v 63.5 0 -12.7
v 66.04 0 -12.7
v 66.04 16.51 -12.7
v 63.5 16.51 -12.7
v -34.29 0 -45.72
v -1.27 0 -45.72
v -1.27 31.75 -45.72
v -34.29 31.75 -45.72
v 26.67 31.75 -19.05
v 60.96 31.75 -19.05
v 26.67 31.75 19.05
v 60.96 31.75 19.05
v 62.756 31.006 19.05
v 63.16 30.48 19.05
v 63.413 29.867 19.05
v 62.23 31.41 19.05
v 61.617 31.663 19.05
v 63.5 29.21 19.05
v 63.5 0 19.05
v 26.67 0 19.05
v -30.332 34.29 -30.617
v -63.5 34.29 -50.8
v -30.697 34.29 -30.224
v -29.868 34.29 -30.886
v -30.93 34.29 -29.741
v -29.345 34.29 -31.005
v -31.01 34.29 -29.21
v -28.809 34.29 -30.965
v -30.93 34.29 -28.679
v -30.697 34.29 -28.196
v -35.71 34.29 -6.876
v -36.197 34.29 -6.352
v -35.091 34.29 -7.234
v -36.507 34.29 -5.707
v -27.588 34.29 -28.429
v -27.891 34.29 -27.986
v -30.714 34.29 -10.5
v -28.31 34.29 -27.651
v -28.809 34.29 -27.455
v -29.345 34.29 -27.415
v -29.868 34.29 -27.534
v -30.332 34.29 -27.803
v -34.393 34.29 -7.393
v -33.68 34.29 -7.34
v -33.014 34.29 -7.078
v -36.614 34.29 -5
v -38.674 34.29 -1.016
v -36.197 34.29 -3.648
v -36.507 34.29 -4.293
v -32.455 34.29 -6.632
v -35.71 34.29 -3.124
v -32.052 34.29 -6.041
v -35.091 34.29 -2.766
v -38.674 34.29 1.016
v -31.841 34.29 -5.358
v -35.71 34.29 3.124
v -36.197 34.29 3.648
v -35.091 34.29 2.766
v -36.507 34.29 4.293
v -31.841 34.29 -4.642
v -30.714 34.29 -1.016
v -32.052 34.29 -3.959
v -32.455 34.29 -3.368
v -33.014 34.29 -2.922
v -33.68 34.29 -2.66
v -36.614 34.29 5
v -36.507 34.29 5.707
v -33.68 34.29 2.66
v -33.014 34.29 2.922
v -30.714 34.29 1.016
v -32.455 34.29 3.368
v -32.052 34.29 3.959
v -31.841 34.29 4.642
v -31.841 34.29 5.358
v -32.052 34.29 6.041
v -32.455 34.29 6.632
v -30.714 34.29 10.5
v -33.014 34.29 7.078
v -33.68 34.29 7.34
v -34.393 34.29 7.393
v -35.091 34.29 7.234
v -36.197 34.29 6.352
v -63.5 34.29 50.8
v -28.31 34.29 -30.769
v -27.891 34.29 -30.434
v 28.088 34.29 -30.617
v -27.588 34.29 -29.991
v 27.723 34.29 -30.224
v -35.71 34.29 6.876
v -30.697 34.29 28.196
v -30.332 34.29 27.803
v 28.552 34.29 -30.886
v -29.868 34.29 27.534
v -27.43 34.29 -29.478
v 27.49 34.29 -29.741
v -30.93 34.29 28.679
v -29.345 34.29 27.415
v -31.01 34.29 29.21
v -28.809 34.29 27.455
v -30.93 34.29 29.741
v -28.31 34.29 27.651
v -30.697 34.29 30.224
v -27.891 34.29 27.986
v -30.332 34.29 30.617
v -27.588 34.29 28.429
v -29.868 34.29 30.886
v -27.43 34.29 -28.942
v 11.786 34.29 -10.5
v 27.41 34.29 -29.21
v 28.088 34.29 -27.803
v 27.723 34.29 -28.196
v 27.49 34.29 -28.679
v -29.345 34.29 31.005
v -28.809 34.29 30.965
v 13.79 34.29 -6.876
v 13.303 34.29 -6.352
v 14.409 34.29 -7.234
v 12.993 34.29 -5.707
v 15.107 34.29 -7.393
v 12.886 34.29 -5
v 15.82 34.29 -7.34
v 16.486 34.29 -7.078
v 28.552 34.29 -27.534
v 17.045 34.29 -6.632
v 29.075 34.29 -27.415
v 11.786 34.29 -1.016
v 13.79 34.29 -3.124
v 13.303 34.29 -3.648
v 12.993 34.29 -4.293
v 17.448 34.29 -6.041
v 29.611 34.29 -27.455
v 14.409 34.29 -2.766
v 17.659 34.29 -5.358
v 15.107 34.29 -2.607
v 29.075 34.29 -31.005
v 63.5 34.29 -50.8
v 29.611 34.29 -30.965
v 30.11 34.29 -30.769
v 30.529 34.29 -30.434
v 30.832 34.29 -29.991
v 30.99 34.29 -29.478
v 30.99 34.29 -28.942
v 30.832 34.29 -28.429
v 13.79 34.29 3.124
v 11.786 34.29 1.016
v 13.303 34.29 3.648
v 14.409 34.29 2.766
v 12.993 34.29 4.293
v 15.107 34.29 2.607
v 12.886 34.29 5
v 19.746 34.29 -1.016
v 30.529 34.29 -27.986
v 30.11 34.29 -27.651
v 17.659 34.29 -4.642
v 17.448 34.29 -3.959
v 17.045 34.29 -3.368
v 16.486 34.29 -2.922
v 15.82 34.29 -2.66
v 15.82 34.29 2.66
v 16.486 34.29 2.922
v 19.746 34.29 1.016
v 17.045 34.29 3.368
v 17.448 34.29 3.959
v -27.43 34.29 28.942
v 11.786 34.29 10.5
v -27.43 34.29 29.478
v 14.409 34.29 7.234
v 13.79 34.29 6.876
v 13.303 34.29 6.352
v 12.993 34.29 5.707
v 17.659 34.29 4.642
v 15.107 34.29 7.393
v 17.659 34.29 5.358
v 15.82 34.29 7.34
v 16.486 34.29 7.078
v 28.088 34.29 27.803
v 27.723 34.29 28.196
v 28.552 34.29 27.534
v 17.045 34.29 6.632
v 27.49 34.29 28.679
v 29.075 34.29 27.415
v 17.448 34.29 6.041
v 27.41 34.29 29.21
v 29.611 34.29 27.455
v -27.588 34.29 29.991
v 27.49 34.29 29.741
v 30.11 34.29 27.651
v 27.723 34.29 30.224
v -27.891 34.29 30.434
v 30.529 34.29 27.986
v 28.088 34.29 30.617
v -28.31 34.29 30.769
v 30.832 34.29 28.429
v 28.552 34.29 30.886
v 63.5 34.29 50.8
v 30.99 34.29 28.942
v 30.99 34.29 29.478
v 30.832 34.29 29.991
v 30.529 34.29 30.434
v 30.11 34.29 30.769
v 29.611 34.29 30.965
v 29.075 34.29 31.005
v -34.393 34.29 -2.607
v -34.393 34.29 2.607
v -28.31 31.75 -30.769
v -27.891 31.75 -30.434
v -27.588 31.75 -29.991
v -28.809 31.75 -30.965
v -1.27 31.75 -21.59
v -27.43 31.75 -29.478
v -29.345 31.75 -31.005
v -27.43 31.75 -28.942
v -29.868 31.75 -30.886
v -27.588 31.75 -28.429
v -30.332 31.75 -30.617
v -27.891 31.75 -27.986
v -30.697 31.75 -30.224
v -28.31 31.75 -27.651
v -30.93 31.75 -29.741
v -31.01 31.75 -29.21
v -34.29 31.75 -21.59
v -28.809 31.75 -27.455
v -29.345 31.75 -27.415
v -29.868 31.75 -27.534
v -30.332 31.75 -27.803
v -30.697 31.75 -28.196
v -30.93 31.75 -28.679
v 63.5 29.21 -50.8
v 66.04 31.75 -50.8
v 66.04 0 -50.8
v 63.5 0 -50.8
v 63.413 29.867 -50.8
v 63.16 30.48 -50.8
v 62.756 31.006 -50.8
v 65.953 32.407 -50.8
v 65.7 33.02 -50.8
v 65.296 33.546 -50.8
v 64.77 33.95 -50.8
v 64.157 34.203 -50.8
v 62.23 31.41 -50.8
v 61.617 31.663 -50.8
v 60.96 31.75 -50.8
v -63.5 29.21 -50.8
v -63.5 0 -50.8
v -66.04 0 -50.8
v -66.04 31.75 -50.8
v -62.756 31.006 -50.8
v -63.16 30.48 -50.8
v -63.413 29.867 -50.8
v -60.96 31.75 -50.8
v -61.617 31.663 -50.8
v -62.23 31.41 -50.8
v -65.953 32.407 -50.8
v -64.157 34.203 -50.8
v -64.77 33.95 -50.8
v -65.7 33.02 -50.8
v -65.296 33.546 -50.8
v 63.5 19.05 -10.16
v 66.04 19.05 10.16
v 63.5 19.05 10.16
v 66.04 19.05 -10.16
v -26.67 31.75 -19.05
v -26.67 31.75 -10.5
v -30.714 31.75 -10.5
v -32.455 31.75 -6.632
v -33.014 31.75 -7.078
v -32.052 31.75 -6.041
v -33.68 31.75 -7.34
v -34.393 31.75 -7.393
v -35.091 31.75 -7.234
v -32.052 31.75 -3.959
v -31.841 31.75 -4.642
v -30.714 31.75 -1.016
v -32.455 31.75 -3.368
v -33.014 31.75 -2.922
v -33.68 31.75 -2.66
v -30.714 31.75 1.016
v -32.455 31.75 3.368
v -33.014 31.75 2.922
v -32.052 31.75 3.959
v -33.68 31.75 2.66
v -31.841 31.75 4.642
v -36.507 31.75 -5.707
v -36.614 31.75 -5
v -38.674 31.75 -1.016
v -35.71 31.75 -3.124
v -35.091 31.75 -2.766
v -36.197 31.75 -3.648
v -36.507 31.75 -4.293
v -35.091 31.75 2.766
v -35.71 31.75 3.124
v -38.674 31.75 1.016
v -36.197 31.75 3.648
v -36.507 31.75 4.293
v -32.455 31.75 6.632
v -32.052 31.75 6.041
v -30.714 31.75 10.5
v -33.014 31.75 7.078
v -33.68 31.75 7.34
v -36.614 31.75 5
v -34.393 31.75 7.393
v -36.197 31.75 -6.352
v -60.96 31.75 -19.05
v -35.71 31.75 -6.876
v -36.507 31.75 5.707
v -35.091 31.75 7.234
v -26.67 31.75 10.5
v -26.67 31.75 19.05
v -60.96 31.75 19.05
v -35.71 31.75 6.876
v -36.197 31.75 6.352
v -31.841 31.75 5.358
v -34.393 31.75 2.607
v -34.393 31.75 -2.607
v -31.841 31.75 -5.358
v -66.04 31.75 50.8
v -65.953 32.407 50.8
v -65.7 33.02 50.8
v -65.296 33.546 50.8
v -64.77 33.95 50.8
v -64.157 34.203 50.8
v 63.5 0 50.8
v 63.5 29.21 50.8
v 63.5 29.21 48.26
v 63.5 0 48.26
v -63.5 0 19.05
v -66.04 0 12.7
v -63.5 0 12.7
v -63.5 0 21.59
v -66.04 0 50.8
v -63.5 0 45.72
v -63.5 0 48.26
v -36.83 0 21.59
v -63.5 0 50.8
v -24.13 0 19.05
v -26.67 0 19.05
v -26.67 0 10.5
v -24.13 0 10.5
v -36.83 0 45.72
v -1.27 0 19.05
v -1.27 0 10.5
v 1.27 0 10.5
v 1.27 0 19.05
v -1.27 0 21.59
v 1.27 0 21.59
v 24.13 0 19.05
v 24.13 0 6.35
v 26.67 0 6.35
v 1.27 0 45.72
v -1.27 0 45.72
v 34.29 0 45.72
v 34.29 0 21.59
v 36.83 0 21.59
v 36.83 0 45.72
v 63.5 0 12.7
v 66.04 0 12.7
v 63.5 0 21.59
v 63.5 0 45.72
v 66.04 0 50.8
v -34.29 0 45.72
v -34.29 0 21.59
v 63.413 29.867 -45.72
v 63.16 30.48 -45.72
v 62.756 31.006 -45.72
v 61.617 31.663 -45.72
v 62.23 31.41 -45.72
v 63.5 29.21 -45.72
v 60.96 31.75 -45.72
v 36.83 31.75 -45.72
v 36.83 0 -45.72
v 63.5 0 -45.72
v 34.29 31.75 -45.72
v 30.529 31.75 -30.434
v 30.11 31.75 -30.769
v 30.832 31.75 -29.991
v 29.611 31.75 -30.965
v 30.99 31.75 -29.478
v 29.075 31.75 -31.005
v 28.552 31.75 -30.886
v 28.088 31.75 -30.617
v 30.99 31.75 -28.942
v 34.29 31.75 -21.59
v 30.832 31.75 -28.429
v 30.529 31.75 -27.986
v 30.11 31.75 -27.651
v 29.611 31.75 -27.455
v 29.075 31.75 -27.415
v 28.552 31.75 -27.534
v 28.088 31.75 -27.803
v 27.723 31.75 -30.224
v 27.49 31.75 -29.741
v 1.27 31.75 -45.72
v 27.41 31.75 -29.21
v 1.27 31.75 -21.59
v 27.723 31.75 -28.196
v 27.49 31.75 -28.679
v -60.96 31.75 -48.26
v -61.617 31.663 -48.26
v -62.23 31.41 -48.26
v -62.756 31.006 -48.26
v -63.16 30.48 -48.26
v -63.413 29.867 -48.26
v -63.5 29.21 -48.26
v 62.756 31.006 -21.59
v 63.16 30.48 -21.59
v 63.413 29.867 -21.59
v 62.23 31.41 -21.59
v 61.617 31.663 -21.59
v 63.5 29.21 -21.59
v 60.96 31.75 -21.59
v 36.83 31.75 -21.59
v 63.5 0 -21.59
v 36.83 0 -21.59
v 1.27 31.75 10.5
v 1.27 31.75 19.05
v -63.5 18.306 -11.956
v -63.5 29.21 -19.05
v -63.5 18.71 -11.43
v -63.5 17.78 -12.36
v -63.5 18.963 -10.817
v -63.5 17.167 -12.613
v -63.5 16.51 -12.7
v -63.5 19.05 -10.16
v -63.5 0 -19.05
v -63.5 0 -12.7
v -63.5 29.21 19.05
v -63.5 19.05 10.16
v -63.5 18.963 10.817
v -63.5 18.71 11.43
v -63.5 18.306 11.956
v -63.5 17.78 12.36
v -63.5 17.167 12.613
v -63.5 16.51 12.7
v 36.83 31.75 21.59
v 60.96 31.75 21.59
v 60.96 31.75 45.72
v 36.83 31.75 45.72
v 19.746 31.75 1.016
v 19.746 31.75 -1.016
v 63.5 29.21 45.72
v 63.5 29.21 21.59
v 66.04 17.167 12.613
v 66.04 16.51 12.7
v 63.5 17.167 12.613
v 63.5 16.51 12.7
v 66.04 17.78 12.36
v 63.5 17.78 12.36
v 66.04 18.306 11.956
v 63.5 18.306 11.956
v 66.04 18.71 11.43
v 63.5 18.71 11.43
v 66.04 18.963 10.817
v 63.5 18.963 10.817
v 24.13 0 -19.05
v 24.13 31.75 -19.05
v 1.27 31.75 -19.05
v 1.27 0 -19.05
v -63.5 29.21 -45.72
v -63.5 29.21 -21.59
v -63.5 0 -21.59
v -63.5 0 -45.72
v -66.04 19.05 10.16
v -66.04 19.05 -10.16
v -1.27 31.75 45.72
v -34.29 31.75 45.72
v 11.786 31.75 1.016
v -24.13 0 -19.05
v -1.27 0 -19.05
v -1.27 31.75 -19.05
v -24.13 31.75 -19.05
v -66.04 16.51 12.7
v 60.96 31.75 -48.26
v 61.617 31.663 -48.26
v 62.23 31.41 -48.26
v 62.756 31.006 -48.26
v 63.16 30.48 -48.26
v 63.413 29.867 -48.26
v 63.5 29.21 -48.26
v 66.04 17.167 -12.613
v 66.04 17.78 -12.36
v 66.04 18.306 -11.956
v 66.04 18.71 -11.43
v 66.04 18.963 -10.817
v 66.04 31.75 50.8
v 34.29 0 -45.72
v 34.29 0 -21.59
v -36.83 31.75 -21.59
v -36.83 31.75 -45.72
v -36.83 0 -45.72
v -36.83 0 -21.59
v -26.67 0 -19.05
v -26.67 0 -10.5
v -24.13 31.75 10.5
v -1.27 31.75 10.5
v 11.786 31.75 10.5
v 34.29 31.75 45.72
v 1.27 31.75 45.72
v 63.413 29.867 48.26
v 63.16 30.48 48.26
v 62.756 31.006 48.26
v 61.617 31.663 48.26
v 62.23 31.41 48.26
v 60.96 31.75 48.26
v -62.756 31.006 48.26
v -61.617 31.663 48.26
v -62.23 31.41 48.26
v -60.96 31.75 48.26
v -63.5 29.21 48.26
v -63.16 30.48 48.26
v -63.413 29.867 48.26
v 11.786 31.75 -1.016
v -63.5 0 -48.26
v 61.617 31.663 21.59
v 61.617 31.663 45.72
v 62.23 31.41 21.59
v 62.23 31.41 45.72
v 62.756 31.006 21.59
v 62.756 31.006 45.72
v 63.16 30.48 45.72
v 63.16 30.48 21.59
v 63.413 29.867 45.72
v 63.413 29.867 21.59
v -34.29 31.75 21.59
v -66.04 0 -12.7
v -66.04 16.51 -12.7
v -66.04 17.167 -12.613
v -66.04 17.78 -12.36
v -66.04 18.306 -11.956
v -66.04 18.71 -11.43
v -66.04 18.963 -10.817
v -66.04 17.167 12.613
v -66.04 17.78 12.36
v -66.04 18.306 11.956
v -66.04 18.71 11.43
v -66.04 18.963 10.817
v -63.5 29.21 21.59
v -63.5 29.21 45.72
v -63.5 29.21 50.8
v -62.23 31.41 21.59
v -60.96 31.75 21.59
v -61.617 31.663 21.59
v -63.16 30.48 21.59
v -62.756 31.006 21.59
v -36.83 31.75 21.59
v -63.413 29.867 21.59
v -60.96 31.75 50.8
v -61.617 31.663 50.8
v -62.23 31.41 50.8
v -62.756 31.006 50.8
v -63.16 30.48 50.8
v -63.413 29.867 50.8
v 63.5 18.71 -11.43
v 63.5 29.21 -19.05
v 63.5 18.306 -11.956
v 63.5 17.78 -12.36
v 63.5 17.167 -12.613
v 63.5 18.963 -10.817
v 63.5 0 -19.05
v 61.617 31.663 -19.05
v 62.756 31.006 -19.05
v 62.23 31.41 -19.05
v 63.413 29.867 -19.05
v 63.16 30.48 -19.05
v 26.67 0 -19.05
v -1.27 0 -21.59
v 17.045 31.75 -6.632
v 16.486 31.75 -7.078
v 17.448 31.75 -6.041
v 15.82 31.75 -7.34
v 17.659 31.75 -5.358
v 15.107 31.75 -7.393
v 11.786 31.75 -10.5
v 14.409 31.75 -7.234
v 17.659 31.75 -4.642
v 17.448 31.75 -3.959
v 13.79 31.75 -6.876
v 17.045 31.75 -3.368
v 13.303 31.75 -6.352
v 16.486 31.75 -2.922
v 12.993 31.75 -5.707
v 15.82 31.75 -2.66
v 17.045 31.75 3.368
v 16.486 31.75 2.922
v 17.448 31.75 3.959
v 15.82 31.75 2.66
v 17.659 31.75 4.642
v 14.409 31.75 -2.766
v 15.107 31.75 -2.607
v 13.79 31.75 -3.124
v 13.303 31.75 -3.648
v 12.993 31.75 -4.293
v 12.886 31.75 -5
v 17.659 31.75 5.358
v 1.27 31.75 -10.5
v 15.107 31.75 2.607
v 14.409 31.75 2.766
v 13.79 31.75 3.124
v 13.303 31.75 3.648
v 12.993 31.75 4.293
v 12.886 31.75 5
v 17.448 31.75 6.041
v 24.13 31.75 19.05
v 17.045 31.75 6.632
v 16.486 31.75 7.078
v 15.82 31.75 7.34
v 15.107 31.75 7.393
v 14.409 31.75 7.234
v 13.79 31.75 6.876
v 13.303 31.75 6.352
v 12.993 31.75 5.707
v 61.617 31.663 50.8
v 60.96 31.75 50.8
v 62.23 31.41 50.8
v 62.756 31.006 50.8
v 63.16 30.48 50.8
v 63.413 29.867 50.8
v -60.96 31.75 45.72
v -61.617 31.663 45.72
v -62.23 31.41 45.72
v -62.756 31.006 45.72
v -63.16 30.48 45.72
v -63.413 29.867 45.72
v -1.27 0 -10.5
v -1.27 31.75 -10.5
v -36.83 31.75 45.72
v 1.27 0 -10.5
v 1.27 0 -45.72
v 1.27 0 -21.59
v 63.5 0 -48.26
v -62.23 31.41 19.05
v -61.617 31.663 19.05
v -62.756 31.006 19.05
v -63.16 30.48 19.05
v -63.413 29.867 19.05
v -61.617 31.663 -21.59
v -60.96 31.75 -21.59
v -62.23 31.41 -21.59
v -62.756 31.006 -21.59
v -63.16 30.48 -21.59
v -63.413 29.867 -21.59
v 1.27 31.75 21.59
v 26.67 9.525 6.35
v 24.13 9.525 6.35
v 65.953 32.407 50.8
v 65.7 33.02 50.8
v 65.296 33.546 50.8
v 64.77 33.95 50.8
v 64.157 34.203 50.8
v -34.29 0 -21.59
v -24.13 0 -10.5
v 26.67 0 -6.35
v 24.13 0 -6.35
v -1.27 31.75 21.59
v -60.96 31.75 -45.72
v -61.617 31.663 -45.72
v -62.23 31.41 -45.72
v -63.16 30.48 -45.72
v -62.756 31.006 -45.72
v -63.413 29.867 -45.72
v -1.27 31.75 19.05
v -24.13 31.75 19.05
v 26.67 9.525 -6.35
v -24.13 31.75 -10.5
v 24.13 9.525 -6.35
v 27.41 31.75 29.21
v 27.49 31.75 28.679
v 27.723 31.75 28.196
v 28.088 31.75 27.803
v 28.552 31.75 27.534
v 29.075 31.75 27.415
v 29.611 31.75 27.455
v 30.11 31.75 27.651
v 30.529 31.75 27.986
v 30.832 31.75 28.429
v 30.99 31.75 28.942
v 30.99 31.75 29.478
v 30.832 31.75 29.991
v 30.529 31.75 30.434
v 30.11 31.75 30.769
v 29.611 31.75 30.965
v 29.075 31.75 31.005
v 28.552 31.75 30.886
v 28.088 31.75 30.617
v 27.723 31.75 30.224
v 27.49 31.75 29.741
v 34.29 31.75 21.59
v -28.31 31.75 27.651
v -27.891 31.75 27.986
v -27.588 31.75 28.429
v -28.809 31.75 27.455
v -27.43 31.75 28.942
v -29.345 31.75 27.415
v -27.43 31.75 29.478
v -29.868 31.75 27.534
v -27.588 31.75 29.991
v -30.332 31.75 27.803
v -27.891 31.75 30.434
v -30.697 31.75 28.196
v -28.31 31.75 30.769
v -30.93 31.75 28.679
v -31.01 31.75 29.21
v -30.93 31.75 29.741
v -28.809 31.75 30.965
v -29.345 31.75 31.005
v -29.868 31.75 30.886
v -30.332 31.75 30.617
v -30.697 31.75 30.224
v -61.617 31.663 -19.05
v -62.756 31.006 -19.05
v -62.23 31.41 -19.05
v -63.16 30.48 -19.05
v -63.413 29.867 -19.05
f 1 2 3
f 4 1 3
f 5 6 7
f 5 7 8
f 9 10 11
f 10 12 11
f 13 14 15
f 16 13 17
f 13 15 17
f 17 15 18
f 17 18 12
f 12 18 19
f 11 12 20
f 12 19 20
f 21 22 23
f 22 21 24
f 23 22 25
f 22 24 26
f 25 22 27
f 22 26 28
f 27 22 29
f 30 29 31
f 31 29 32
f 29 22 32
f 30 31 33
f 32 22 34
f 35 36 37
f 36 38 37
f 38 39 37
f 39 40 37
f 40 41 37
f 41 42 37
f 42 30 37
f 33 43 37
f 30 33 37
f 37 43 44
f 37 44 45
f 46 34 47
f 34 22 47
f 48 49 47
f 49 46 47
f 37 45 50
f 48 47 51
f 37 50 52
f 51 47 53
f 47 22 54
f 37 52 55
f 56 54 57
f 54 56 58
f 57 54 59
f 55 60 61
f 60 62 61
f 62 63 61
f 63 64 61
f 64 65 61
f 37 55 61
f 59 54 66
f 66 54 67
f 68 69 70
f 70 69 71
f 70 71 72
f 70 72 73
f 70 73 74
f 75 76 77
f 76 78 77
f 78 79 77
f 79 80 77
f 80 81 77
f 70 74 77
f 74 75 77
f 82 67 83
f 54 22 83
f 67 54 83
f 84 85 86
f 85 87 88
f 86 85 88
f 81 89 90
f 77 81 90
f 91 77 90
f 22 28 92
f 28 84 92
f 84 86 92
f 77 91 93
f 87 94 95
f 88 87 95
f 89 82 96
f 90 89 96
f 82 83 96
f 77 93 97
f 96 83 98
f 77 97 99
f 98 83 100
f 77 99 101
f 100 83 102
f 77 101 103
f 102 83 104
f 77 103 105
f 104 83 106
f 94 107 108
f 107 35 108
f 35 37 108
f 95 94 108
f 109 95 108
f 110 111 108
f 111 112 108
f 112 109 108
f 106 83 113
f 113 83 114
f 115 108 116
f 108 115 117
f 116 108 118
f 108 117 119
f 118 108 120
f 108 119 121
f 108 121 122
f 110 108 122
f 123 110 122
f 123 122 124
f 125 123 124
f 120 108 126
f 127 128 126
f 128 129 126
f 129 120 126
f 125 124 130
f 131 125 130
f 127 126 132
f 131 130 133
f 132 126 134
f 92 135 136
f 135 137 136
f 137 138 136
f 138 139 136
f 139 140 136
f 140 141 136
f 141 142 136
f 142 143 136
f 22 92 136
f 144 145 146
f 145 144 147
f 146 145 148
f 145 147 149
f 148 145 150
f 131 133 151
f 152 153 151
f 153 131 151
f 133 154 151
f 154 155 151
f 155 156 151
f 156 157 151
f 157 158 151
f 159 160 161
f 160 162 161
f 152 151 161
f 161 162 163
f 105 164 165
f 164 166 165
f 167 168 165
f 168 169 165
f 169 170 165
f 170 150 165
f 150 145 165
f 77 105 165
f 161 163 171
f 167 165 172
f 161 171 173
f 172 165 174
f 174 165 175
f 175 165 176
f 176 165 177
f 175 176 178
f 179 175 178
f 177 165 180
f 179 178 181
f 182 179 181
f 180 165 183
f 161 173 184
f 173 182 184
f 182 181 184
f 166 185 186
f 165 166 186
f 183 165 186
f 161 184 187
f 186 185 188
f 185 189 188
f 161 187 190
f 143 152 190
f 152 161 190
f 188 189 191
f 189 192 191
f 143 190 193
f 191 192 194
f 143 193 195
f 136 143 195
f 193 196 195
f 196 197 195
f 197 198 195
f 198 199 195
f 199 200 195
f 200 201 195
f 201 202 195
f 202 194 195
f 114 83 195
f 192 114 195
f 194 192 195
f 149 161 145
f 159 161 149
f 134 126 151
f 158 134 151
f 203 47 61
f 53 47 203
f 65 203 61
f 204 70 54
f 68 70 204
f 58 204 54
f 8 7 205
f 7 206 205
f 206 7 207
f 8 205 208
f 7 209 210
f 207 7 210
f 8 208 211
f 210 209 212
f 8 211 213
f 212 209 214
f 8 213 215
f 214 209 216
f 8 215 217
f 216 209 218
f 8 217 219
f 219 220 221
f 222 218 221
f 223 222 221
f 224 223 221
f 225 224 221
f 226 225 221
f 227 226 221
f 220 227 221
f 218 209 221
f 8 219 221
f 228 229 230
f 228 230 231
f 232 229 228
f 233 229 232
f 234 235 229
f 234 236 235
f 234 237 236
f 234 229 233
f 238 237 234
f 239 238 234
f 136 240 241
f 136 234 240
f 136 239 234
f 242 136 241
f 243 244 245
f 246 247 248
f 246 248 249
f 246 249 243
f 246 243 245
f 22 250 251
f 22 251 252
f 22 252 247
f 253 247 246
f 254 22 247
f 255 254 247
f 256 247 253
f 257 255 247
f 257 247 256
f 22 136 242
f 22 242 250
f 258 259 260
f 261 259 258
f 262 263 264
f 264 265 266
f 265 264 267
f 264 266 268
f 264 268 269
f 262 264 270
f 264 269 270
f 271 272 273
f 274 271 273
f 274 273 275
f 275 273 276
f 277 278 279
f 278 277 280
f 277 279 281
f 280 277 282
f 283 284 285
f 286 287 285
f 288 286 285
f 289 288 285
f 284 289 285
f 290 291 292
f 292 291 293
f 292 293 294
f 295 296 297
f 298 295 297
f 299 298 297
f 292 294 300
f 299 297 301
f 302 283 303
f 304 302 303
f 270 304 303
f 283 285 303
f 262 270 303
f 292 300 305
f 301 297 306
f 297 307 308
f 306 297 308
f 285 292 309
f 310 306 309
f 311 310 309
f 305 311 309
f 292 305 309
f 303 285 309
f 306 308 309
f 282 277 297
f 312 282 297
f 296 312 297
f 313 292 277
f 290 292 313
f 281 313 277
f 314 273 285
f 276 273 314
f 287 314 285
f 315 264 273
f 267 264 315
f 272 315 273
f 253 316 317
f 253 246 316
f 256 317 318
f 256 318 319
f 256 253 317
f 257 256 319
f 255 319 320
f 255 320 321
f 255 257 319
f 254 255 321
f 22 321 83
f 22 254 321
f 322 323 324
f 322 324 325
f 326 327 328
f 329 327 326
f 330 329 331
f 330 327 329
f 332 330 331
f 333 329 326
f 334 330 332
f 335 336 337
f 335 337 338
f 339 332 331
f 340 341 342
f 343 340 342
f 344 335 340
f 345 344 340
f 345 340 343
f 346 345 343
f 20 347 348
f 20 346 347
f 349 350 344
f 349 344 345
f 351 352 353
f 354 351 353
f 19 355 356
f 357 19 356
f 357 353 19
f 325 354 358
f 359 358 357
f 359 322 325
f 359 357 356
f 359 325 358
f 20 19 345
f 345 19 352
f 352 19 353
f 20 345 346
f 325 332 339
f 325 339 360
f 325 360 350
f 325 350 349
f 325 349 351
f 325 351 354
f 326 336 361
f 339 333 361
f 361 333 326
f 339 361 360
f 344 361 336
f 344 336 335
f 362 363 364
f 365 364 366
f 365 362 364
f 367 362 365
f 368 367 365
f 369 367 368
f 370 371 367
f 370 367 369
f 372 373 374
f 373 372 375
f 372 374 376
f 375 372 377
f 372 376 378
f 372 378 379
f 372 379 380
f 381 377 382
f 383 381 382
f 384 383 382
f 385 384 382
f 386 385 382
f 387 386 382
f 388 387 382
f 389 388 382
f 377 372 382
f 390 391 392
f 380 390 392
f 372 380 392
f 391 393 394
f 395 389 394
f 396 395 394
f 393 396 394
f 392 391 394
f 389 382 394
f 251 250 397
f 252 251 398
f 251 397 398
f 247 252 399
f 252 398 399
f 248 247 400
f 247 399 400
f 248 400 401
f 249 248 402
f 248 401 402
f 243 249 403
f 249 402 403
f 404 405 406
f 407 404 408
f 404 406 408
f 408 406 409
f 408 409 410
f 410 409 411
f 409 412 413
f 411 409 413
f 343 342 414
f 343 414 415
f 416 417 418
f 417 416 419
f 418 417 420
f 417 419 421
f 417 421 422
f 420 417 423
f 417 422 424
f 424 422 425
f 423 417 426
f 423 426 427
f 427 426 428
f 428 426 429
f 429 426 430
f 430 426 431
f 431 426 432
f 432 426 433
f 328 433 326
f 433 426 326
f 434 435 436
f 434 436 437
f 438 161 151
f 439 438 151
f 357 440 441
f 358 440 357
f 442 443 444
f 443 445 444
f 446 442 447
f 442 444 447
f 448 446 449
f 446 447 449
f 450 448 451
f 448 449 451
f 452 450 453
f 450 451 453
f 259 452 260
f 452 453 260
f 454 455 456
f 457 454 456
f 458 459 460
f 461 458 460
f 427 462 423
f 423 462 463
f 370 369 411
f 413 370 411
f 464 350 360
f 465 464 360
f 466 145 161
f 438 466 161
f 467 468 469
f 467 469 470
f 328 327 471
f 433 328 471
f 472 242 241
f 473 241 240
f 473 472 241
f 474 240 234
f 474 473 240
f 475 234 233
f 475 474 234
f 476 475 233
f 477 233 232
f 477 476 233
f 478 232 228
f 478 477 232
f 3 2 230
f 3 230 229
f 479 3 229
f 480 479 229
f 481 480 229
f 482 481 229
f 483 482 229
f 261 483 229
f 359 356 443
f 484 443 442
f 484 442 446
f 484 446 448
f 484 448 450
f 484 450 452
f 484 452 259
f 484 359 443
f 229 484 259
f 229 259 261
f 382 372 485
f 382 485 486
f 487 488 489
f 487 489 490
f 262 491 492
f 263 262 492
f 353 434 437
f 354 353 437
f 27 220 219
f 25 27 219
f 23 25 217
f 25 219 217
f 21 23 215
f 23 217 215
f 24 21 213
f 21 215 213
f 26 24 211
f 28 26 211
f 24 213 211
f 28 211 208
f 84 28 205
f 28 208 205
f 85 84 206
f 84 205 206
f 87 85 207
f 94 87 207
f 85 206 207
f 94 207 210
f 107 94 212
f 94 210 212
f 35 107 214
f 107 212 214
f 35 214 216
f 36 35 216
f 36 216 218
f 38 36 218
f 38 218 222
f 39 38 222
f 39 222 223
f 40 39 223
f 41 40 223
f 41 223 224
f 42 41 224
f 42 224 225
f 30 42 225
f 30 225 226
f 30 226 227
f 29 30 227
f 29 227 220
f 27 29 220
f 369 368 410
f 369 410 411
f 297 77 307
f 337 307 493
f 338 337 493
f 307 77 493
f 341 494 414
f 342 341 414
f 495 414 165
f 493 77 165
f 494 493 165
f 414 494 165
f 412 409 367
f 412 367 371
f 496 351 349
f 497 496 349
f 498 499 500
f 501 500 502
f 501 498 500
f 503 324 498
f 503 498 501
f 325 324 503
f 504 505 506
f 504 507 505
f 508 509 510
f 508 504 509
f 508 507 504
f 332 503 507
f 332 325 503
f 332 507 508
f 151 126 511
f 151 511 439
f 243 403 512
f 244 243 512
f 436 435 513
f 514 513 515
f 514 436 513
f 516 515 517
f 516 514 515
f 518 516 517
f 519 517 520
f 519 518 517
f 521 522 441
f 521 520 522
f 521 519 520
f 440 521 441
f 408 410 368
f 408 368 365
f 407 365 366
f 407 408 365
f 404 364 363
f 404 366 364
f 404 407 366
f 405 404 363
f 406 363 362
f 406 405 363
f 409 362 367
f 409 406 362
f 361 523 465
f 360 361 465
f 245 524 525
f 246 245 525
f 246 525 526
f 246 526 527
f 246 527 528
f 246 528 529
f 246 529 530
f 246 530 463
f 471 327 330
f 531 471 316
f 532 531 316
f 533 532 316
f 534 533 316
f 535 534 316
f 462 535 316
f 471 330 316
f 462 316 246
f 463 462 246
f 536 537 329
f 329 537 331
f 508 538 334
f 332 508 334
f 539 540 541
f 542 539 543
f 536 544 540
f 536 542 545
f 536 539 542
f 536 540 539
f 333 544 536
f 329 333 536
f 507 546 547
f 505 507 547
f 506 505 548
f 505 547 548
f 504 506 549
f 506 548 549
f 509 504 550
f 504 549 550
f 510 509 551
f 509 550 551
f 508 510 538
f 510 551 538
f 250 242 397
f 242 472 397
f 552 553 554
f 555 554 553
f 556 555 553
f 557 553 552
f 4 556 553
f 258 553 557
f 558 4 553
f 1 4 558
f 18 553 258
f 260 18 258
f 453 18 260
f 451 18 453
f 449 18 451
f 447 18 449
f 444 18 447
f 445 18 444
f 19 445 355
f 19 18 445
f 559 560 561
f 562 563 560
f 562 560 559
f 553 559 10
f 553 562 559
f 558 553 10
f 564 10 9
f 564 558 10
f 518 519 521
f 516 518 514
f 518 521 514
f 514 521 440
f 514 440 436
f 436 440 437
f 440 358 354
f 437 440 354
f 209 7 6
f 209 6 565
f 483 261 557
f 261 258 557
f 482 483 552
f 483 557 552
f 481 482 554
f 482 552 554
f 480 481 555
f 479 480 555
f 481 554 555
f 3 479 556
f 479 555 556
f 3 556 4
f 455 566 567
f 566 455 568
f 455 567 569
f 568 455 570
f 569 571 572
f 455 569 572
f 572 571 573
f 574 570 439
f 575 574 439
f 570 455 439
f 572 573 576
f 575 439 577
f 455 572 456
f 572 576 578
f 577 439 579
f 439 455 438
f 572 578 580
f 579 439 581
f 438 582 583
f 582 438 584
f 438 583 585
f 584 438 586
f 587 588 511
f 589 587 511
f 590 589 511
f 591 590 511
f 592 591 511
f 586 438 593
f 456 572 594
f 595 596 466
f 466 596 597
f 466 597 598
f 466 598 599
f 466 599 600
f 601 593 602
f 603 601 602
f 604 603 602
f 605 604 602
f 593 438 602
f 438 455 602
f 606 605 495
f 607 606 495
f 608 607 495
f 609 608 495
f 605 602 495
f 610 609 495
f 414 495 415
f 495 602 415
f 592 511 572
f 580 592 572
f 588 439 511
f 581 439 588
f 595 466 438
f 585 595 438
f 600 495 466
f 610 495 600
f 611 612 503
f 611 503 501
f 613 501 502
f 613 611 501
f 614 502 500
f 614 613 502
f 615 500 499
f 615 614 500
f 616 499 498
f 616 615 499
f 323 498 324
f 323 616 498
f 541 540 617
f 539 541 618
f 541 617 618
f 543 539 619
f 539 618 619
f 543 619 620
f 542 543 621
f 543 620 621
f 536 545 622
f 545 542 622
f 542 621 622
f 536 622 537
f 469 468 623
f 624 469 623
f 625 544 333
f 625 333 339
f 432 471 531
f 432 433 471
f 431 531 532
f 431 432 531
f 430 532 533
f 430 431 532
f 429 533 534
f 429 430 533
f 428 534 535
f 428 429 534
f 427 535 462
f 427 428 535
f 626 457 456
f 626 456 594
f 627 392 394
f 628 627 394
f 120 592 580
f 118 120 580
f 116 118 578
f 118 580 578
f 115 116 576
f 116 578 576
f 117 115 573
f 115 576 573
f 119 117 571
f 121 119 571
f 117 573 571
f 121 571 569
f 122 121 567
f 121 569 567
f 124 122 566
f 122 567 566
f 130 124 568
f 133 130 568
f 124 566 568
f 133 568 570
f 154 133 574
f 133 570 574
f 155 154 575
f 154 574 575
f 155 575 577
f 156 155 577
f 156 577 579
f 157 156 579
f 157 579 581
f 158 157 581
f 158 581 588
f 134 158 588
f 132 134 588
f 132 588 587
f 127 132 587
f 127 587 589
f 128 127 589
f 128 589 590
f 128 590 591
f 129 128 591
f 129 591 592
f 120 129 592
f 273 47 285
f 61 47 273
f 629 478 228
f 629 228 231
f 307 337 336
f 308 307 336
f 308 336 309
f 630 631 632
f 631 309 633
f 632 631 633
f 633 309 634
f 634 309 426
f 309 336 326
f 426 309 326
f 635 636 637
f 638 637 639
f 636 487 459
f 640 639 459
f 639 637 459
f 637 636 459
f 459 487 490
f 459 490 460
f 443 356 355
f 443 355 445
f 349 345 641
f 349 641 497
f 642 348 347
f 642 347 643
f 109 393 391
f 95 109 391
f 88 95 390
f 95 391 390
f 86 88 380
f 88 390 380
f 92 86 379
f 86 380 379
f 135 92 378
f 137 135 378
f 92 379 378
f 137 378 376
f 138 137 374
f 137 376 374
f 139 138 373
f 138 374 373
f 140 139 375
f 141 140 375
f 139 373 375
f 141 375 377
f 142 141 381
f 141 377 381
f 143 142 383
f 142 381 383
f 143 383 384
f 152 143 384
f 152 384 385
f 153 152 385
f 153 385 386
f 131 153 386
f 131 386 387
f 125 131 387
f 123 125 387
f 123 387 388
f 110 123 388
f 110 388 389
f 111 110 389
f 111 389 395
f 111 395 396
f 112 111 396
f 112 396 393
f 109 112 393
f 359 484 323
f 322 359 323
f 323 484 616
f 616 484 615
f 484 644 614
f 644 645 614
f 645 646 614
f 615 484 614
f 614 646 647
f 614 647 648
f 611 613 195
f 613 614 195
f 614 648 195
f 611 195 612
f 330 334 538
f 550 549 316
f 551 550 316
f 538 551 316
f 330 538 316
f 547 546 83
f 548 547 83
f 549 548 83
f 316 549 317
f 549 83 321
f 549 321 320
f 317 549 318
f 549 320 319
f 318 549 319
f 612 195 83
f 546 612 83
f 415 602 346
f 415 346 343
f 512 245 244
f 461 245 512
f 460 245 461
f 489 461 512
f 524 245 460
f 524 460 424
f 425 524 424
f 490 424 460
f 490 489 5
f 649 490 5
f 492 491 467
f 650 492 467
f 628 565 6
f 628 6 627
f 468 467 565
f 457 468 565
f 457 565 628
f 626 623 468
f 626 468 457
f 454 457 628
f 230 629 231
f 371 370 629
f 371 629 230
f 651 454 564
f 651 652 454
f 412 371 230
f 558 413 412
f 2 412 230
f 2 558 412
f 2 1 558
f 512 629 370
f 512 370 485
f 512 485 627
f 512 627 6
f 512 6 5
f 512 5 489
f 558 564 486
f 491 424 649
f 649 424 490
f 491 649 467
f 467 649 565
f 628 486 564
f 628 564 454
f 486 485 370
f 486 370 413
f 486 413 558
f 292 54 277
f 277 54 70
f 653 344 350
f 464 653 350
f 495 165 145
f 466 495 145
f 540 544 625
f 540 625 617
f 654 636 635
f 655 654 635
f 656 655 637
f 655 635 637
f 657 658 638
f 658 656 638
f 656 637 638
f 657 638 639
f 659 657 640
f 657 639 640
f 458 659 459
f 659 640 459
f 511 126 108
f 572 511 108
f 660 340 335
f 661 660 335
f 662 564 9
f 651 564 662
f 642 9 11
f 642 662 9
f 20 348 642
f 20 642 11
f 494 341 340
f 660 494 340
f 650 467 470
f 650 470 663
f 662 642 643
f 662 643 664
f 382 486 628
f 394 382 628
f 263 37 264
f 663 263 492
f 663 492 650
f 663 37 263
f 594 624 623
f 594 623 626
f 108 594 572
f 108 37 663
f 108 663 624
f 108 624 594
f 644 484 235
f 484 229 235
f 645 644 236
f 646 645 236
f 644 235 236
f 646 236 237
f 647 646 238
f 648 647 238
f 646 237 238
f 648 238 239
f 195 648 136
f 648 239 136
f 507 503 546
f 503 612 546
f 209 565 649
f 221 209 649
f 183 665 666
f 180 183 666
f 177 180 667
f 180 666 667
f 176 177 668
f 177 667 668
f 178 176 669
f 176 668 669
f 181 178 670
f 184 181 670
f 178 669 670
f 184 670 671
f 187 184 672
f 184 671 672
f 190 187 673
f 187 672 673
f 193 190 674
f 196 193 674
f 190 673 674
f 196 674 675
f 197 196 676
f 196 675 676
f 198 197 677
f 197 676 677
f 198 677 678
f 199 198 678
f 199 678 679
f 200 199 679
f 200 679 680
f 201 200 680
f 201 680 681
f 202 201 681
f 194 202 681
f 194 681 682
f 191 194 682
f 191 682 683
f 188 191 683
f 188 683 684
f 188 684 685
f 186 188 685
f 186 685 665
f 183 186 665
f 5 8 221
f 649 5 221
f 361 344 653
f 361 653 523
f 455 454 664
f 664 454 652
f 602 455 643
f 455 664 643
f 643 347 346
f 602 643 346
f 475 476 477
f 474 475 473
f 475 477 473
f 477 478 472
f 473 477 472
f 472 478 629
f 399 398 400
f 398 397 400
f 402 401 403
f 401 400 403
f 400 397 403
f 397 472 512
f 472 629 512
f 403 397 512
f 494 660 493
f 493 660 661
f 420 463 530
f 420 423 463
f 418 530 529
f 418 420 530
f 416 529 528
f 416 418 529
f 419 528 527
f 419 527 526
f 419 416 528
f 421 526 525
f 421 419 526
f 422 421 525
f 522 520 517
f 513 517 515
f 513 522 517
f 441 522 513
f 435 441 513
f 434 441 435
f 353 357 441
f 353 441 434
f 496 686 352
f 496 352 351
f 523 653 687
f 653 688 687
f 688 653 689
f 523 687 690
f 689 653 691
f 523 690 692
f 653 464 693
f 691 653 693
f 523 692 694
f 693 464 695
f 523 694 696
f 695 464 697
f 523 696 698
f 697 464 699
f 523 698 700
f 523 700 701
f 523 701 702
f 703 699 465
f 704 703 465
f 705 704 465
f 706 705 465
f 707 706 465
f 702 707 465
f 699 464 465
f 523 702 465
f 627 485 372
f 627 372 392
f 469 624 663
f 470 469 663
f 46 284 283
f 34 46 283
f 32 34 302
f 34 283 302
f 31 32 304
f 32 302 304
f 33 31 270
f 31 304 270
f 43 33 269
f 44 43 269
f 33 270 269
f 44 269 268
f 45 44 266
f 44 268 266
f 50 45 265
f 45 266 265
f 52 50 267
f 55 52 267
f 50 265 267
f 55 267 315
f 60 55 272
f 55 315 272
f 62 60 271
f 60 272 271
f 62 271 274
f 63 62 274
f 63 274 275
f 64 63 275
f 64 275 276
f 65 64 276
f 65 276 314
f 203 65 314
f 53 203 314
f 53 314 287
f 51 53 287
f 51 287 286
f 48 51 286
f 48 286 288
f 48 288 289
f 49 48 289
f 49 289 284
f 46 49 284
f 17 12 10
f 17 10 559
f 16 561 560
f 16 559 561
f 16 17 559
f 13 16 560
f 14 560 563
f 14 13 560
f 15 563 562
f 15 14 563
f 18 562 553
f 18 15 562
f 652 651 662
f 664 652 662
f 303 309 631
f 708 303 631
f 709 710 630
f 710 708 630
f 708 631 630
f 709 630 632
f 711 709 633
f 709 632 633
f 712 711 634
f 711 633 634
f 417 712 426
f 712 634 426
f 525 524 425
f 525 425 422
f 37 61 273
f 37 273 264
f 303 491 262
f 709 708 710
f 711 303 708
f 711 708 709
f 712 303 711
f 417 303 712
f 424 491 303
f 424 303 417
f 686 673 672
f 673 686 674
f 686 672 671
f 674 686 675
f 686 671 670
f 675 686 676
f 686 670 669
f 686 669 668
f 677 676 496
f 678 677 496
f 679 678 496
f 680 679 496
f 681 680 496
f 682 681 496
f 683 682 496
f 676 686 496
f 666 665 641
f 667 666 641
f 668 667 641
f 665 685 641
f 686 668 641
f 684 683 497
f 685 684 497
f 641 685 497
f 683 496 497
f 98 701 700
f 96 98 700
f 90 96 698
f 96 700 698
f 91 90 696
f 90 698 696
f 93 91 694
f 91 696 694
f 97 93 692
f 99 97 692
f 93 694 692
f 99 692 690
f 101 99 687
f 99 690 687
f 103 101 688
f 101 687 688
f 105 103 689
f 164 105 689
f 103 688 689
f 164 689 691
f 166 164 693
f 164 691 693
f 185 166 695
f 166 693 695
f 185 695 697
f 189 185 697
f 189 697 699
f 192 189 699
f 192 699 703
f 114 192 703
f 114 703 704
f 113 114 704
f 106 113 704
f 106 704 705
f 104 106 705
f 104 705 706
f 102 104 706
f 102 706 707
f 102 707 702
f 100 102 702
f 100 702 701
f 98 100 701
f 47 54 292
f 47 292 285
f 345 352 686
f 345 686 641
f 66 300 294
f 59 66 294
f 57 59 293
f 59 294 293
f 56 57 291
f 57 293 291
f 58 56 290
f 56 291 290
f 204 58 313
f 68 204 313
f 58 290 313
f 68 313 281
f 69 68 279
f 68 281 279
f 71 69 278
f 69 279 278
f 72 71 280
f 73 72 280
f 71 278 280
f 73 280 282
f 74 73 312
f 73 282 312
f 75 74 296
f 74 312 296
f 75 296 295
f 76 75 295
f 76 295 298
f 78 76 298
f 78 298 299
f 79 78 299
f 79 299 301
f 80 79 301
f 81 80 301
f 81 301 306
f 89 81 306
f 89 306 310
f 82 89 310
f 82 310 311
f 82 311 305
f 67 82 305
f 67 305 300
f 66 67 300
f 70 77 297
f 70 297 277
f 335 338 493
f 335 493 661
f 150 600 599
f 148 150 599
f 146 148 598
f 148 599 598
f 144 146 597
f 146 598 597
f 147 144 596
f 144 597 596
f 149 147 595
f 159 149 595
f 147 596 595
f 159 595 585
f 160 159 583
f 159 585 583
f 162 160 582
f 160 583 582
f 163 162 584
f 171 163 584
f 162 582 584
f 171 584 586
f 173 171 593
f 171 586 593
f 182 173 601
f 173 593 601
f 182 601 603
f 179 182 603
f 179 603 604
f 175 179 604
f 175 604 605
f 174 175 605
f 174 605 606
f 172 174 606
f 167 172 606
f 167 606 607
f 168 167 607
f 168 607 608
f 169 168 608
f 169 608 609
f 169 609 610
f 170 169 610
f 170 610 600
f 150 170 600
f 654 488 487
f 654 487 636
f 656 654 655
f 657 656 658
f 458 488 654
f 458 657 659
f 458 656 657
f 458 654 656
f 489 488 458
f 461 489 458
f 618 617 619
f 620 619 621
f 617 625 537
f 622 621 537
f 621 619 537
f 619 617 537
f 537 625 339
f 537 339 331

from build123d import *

# Parameters (mm, degrees)
EXTRUDE_THIN1_DEPTH  = 50.8
CUT_EXTRUDE1_REACH   = 92.098
SKETCH4_W            = 25.4
SKETCH4_H            = 19.05
FILLET1_R            = 2.54
EXTRUDE_THIN2_REACH  = 92.098
SKETCH3_W            = 63.5
SKETCH3_H            = 2.54
SKETCH9_W            = 2.54
SKETCH9_H            = 38.1
SKETCH9_H_2          = 91.44
SKETCH9_H_3          = 24.13
EXTRUDE_THIN3_DEPTH  = 31.75
CUT_EXTRUDE2_REACH   = 92.098
SKETCH5_W            = 42.5
SKETCH5_H            = 21
M4_CLEARANCE_HOLE1_D = 4.8
CUT_EXTRUDE4_REACH   = 92.098
SKETCH7_W            = 7.96
SKETCH7_H            = 2.032
CUT_EXTRUDE5_REACH   = 113.138
SKETCH10_W           = 12.7
SKETCH10_H           = 9.525
M3_CLEARANCE_HOLE1_D = 3.6


# Read off the part's stored shape, not the designer's step: Mirror2
with BuildPart() as part:
    # Sketch2 → Extrude-Thin1 (new, symmetric)
    with BuildSketch(Plane.XY):
        Polygon((0, 31.75), (63.5, 31.75), (63.5, 0), (66.04, 0), (66.04, 34.29), (0, 34.29), align=None)
    extrude(amount=EXTRUDE_THIN1_DEPTH, both=True)

    # Sketch4 → Cut-Extrude1 (cut, up to next)
    with BuildSketch(Plane(origin=(66.04, 0, 0), x_dir=(0, 0, -1), z_dir=(1, 0, 0)), mode=Mode.PRIVATE) as cut_extrude1_sk1:
        with Locations((0, 9.525)):
            Rectangle(SKETCH4_W, SKETCH4_H)
    cut_extrude1_tool1 = extrude(cut_extrude1_sk1.sketch, amount=-CUT_EXTRUDE1_REACH, mode=Mode.PRIVATE) & part.part
    add(cut_extrude1_tool1.solids().sort_by_distance((66.04, 9.525, 0))[0], mode=Mode.SUBTRACT)

    # Fillet1
    fillet1_edges = [part.edges().sort_by_distance(p)[0] for p in [
        (64.77, 19.05, 12.7),
        (64.77, 19.05, -12.7),
        (63.5, 31.75, 0),
        (66.04, 34.29, 0),
    ]]
    fillet(fillet1_edges, radius=FILLET1_R)

    # Sketch3 → Extrude-Thin2 (add, up to next)
    with BuildSketch(Plane.XZ, mode=Mode.PRIVATE) as extrude_thin2_sk1:
        with Locations((31.75, 20.32)):
            Rectangle(SKETCH3_W, SKETCH3_H)
    extrude_thin2_tool1 = extrude(extrude_thin2_sk1.sketch, amount=-EXTRUDE_THIN2_REACH, mode=Mode.PRIVATE) - part.part
    # Sketch3 → Extrude-Thin2 (add, up to next)
    with BuildSketch(Plane.XZ, mode=Mode.PRIVATE) as extrude_thin2_sk2:
        with Locations((31.75, 46.99)):
            Rectangle(SKETCH3_W, SKETCH3_H)
    extrude_thin2_tool2 = extrude(extrude_thin2_sk2.sketch, amount=-EXTRUDE_THIN2_REACH, mode=Mode.PRIVATE) - part.part
    extrude_thin2_1 = extrude_thin2_tool1.solids().sort_by_distance((31.75, 0, 20.32))[0]
    add(extrude_thin2_1)
    extrude_thin2_2 = extrude_thin2_tool2.solids().sort_by_distance((31.75, 0, 46.99))[0]
    add(extrude_thin2_2)
    extrude_thin2 = extrude_thin2_1 + extrude_thin2_2  # Extrude-Thin2 as one shape, for the pattern or mirror that repeats it

    # Mirror1: Extrude-Thin2 across plane
    add(extrude_thin2.mirror(Plane.XY))

    # Mirror2: part across plane


with BuildPart() as part_1:
    add(part.part)
    add(part.part.mirror(Plane(origin=(0, 0, 0), x_dir=(0, 0, 1), z_dir=(1, 0, 0))))

    # Sketch9 → Extrude-Thin3 (add)
    with BuildSketch(Plane.XZ):
        with Locations((-25.4, 0)):
            Rectangle(SKETCH9_W, SKETCH9_H)
        Rectangle(SKETCH9_W, SKETCH9_H_2)
        with Locations((25.4, 0)):
            Rectangle(SKETCH9_W, SKETCH9_H)
        with Locations((-35.56, 33.655)):
            Rectangle(SKETCH9_W, SKETCH9_H_3)
        with Locations((-35.56, -33.655)):
            Rectangle(SKETCH9_W, SKETCH9_H_3)
        with Locations((35.56, 33.655)):
            Rectangle(SKETCH9_W, SKETCH9_H_3)
        with Locations((35.56, -33.655)):
            Rectangle(SKETCH9_W, SKETCH9_H_3)
    extrude(amount=-EXTRUDE_THIN3_DEPTH)

    # Sketch5 → Cut-Extrude2 (cut, up to next)
    with BuildSketch(Plane(origin=(0, 34.29, 0), x_dir=(1, 0, 0), z_dir=(0, 1, 0)), mode=Mode.PRIVATE) as cut_extrude2_sk1:
        with Locations((-9.464, 0)):
            Rectangle(SKETCH5_W, SKETCH5_H)
    cut_extrude2_tool1 = extrude(cut_extrude2_sk1.sketch, amount=-CUT_EXTRUDE2_REACH, mode=Mode.PRIVATE) & part_1.part
    add(cut_extrude2_tool1.solids().sort_by_distance((-9.464, 34.29, 0))[0], mode=Mode.SUBTRACT)

    # M4 Clearance Hole1 (through all)
    with Locations(Plane(origin=(0, 34.29, 0), x_dir=(1, 0, 0), z_dir=(0, 1, 0))):
        with Locations((15.286, -5), (15.286, 5), (-34.214, 5), (-34.214, -5)):
            Hole(M4_CLEARANCE_HOLE1_D / 2)

    # Sketch7 → Cut-Extrude4 (cut, up to next)
    with BuildSketch(Plane(origin=(0, 34.29, 0), x_dir=(1, 0, 0), z_dir=(0, 1, 0)), mode=Mode.PRIVATE) as cut_extrude4_sk1:
        with Locations((15.766, 0)):
            Rectangle(SKETCH7_W, SKETCH7_H)
    cut_extrude4_tool1 = extrude(cut_extrude4_sk1.sketch, amount=-CUT_EXTRUDE4_REACH, mode=Mode.PRIVATE) & part_1.part
    # Sketch7 → Cut-Extrude4 (cut, up to next)
    with BuildSketch(Plane(origin=(0, 34.29, 0), x_dir=(1, 0, 0), z_dir=(0, 1, 0)), mode=Mode.PRIVATE) as cut_extrude4_sk2:
        with Locations((-34.694, 0)):
            Rectangle(SKETCH7_W, SKETCH7_H)
    cut_extrude4_tool2 = extrude(cut_extrude4_sk2.sketch, amount=-CUT_EXTRUDE4_REACH, mode=Mode.PRIVATE) & part_1.part
    add(cut_extrude4_tool1.solids().sort_by_distance((15.766, 34.29, 0))[0], mode=Mode.SUBTRACT)
    add(cut_extrude4_tool2.solids().sort_by_distance((-34.694, 34.29, 0))[0], mode=Mode.SUBTRACT)

    # Sketch10 → Cut-Extrude5 (cut, up to next)
    with BuildSketch(Plane(origin=(26.67, 0, 0), x_dir=(0, 0, -1), z_dir=(1, 0, 0)), mode=Mode.PRIVATE) as cut_extrude5_sk1:
        with Locations((0, 4.7625)):
            Rectangle(SKETCH10_W, SKETCH10_H)
    cut_extrude5_tool1 = extrude(cut_extrude5_sk1.sketch, amount=-CUT_EXTRUDE5_REACH, mode=Mode.PRIVATE) & part_1.part
    add(cut_extrude5_tool1.solids().sort_by_distance((26.67, 4.7625, 0))[0], mode=Mode.SUBTRACT)

    # M3 Clearance Hole1 (through all)
    with Locations(Plane(origin=(0, 34.29, 0), x_dir=(1, 0, 0), z_dir=(0, 1, 0))):
        with Locations((-29.21, 29.21), (29.21, 29.21), (29.21, -29.21), (-29.21, -29.21)):
            Hole(M3_CLEARANCE_HOLE1_D / 2)


solid = part_1.part
